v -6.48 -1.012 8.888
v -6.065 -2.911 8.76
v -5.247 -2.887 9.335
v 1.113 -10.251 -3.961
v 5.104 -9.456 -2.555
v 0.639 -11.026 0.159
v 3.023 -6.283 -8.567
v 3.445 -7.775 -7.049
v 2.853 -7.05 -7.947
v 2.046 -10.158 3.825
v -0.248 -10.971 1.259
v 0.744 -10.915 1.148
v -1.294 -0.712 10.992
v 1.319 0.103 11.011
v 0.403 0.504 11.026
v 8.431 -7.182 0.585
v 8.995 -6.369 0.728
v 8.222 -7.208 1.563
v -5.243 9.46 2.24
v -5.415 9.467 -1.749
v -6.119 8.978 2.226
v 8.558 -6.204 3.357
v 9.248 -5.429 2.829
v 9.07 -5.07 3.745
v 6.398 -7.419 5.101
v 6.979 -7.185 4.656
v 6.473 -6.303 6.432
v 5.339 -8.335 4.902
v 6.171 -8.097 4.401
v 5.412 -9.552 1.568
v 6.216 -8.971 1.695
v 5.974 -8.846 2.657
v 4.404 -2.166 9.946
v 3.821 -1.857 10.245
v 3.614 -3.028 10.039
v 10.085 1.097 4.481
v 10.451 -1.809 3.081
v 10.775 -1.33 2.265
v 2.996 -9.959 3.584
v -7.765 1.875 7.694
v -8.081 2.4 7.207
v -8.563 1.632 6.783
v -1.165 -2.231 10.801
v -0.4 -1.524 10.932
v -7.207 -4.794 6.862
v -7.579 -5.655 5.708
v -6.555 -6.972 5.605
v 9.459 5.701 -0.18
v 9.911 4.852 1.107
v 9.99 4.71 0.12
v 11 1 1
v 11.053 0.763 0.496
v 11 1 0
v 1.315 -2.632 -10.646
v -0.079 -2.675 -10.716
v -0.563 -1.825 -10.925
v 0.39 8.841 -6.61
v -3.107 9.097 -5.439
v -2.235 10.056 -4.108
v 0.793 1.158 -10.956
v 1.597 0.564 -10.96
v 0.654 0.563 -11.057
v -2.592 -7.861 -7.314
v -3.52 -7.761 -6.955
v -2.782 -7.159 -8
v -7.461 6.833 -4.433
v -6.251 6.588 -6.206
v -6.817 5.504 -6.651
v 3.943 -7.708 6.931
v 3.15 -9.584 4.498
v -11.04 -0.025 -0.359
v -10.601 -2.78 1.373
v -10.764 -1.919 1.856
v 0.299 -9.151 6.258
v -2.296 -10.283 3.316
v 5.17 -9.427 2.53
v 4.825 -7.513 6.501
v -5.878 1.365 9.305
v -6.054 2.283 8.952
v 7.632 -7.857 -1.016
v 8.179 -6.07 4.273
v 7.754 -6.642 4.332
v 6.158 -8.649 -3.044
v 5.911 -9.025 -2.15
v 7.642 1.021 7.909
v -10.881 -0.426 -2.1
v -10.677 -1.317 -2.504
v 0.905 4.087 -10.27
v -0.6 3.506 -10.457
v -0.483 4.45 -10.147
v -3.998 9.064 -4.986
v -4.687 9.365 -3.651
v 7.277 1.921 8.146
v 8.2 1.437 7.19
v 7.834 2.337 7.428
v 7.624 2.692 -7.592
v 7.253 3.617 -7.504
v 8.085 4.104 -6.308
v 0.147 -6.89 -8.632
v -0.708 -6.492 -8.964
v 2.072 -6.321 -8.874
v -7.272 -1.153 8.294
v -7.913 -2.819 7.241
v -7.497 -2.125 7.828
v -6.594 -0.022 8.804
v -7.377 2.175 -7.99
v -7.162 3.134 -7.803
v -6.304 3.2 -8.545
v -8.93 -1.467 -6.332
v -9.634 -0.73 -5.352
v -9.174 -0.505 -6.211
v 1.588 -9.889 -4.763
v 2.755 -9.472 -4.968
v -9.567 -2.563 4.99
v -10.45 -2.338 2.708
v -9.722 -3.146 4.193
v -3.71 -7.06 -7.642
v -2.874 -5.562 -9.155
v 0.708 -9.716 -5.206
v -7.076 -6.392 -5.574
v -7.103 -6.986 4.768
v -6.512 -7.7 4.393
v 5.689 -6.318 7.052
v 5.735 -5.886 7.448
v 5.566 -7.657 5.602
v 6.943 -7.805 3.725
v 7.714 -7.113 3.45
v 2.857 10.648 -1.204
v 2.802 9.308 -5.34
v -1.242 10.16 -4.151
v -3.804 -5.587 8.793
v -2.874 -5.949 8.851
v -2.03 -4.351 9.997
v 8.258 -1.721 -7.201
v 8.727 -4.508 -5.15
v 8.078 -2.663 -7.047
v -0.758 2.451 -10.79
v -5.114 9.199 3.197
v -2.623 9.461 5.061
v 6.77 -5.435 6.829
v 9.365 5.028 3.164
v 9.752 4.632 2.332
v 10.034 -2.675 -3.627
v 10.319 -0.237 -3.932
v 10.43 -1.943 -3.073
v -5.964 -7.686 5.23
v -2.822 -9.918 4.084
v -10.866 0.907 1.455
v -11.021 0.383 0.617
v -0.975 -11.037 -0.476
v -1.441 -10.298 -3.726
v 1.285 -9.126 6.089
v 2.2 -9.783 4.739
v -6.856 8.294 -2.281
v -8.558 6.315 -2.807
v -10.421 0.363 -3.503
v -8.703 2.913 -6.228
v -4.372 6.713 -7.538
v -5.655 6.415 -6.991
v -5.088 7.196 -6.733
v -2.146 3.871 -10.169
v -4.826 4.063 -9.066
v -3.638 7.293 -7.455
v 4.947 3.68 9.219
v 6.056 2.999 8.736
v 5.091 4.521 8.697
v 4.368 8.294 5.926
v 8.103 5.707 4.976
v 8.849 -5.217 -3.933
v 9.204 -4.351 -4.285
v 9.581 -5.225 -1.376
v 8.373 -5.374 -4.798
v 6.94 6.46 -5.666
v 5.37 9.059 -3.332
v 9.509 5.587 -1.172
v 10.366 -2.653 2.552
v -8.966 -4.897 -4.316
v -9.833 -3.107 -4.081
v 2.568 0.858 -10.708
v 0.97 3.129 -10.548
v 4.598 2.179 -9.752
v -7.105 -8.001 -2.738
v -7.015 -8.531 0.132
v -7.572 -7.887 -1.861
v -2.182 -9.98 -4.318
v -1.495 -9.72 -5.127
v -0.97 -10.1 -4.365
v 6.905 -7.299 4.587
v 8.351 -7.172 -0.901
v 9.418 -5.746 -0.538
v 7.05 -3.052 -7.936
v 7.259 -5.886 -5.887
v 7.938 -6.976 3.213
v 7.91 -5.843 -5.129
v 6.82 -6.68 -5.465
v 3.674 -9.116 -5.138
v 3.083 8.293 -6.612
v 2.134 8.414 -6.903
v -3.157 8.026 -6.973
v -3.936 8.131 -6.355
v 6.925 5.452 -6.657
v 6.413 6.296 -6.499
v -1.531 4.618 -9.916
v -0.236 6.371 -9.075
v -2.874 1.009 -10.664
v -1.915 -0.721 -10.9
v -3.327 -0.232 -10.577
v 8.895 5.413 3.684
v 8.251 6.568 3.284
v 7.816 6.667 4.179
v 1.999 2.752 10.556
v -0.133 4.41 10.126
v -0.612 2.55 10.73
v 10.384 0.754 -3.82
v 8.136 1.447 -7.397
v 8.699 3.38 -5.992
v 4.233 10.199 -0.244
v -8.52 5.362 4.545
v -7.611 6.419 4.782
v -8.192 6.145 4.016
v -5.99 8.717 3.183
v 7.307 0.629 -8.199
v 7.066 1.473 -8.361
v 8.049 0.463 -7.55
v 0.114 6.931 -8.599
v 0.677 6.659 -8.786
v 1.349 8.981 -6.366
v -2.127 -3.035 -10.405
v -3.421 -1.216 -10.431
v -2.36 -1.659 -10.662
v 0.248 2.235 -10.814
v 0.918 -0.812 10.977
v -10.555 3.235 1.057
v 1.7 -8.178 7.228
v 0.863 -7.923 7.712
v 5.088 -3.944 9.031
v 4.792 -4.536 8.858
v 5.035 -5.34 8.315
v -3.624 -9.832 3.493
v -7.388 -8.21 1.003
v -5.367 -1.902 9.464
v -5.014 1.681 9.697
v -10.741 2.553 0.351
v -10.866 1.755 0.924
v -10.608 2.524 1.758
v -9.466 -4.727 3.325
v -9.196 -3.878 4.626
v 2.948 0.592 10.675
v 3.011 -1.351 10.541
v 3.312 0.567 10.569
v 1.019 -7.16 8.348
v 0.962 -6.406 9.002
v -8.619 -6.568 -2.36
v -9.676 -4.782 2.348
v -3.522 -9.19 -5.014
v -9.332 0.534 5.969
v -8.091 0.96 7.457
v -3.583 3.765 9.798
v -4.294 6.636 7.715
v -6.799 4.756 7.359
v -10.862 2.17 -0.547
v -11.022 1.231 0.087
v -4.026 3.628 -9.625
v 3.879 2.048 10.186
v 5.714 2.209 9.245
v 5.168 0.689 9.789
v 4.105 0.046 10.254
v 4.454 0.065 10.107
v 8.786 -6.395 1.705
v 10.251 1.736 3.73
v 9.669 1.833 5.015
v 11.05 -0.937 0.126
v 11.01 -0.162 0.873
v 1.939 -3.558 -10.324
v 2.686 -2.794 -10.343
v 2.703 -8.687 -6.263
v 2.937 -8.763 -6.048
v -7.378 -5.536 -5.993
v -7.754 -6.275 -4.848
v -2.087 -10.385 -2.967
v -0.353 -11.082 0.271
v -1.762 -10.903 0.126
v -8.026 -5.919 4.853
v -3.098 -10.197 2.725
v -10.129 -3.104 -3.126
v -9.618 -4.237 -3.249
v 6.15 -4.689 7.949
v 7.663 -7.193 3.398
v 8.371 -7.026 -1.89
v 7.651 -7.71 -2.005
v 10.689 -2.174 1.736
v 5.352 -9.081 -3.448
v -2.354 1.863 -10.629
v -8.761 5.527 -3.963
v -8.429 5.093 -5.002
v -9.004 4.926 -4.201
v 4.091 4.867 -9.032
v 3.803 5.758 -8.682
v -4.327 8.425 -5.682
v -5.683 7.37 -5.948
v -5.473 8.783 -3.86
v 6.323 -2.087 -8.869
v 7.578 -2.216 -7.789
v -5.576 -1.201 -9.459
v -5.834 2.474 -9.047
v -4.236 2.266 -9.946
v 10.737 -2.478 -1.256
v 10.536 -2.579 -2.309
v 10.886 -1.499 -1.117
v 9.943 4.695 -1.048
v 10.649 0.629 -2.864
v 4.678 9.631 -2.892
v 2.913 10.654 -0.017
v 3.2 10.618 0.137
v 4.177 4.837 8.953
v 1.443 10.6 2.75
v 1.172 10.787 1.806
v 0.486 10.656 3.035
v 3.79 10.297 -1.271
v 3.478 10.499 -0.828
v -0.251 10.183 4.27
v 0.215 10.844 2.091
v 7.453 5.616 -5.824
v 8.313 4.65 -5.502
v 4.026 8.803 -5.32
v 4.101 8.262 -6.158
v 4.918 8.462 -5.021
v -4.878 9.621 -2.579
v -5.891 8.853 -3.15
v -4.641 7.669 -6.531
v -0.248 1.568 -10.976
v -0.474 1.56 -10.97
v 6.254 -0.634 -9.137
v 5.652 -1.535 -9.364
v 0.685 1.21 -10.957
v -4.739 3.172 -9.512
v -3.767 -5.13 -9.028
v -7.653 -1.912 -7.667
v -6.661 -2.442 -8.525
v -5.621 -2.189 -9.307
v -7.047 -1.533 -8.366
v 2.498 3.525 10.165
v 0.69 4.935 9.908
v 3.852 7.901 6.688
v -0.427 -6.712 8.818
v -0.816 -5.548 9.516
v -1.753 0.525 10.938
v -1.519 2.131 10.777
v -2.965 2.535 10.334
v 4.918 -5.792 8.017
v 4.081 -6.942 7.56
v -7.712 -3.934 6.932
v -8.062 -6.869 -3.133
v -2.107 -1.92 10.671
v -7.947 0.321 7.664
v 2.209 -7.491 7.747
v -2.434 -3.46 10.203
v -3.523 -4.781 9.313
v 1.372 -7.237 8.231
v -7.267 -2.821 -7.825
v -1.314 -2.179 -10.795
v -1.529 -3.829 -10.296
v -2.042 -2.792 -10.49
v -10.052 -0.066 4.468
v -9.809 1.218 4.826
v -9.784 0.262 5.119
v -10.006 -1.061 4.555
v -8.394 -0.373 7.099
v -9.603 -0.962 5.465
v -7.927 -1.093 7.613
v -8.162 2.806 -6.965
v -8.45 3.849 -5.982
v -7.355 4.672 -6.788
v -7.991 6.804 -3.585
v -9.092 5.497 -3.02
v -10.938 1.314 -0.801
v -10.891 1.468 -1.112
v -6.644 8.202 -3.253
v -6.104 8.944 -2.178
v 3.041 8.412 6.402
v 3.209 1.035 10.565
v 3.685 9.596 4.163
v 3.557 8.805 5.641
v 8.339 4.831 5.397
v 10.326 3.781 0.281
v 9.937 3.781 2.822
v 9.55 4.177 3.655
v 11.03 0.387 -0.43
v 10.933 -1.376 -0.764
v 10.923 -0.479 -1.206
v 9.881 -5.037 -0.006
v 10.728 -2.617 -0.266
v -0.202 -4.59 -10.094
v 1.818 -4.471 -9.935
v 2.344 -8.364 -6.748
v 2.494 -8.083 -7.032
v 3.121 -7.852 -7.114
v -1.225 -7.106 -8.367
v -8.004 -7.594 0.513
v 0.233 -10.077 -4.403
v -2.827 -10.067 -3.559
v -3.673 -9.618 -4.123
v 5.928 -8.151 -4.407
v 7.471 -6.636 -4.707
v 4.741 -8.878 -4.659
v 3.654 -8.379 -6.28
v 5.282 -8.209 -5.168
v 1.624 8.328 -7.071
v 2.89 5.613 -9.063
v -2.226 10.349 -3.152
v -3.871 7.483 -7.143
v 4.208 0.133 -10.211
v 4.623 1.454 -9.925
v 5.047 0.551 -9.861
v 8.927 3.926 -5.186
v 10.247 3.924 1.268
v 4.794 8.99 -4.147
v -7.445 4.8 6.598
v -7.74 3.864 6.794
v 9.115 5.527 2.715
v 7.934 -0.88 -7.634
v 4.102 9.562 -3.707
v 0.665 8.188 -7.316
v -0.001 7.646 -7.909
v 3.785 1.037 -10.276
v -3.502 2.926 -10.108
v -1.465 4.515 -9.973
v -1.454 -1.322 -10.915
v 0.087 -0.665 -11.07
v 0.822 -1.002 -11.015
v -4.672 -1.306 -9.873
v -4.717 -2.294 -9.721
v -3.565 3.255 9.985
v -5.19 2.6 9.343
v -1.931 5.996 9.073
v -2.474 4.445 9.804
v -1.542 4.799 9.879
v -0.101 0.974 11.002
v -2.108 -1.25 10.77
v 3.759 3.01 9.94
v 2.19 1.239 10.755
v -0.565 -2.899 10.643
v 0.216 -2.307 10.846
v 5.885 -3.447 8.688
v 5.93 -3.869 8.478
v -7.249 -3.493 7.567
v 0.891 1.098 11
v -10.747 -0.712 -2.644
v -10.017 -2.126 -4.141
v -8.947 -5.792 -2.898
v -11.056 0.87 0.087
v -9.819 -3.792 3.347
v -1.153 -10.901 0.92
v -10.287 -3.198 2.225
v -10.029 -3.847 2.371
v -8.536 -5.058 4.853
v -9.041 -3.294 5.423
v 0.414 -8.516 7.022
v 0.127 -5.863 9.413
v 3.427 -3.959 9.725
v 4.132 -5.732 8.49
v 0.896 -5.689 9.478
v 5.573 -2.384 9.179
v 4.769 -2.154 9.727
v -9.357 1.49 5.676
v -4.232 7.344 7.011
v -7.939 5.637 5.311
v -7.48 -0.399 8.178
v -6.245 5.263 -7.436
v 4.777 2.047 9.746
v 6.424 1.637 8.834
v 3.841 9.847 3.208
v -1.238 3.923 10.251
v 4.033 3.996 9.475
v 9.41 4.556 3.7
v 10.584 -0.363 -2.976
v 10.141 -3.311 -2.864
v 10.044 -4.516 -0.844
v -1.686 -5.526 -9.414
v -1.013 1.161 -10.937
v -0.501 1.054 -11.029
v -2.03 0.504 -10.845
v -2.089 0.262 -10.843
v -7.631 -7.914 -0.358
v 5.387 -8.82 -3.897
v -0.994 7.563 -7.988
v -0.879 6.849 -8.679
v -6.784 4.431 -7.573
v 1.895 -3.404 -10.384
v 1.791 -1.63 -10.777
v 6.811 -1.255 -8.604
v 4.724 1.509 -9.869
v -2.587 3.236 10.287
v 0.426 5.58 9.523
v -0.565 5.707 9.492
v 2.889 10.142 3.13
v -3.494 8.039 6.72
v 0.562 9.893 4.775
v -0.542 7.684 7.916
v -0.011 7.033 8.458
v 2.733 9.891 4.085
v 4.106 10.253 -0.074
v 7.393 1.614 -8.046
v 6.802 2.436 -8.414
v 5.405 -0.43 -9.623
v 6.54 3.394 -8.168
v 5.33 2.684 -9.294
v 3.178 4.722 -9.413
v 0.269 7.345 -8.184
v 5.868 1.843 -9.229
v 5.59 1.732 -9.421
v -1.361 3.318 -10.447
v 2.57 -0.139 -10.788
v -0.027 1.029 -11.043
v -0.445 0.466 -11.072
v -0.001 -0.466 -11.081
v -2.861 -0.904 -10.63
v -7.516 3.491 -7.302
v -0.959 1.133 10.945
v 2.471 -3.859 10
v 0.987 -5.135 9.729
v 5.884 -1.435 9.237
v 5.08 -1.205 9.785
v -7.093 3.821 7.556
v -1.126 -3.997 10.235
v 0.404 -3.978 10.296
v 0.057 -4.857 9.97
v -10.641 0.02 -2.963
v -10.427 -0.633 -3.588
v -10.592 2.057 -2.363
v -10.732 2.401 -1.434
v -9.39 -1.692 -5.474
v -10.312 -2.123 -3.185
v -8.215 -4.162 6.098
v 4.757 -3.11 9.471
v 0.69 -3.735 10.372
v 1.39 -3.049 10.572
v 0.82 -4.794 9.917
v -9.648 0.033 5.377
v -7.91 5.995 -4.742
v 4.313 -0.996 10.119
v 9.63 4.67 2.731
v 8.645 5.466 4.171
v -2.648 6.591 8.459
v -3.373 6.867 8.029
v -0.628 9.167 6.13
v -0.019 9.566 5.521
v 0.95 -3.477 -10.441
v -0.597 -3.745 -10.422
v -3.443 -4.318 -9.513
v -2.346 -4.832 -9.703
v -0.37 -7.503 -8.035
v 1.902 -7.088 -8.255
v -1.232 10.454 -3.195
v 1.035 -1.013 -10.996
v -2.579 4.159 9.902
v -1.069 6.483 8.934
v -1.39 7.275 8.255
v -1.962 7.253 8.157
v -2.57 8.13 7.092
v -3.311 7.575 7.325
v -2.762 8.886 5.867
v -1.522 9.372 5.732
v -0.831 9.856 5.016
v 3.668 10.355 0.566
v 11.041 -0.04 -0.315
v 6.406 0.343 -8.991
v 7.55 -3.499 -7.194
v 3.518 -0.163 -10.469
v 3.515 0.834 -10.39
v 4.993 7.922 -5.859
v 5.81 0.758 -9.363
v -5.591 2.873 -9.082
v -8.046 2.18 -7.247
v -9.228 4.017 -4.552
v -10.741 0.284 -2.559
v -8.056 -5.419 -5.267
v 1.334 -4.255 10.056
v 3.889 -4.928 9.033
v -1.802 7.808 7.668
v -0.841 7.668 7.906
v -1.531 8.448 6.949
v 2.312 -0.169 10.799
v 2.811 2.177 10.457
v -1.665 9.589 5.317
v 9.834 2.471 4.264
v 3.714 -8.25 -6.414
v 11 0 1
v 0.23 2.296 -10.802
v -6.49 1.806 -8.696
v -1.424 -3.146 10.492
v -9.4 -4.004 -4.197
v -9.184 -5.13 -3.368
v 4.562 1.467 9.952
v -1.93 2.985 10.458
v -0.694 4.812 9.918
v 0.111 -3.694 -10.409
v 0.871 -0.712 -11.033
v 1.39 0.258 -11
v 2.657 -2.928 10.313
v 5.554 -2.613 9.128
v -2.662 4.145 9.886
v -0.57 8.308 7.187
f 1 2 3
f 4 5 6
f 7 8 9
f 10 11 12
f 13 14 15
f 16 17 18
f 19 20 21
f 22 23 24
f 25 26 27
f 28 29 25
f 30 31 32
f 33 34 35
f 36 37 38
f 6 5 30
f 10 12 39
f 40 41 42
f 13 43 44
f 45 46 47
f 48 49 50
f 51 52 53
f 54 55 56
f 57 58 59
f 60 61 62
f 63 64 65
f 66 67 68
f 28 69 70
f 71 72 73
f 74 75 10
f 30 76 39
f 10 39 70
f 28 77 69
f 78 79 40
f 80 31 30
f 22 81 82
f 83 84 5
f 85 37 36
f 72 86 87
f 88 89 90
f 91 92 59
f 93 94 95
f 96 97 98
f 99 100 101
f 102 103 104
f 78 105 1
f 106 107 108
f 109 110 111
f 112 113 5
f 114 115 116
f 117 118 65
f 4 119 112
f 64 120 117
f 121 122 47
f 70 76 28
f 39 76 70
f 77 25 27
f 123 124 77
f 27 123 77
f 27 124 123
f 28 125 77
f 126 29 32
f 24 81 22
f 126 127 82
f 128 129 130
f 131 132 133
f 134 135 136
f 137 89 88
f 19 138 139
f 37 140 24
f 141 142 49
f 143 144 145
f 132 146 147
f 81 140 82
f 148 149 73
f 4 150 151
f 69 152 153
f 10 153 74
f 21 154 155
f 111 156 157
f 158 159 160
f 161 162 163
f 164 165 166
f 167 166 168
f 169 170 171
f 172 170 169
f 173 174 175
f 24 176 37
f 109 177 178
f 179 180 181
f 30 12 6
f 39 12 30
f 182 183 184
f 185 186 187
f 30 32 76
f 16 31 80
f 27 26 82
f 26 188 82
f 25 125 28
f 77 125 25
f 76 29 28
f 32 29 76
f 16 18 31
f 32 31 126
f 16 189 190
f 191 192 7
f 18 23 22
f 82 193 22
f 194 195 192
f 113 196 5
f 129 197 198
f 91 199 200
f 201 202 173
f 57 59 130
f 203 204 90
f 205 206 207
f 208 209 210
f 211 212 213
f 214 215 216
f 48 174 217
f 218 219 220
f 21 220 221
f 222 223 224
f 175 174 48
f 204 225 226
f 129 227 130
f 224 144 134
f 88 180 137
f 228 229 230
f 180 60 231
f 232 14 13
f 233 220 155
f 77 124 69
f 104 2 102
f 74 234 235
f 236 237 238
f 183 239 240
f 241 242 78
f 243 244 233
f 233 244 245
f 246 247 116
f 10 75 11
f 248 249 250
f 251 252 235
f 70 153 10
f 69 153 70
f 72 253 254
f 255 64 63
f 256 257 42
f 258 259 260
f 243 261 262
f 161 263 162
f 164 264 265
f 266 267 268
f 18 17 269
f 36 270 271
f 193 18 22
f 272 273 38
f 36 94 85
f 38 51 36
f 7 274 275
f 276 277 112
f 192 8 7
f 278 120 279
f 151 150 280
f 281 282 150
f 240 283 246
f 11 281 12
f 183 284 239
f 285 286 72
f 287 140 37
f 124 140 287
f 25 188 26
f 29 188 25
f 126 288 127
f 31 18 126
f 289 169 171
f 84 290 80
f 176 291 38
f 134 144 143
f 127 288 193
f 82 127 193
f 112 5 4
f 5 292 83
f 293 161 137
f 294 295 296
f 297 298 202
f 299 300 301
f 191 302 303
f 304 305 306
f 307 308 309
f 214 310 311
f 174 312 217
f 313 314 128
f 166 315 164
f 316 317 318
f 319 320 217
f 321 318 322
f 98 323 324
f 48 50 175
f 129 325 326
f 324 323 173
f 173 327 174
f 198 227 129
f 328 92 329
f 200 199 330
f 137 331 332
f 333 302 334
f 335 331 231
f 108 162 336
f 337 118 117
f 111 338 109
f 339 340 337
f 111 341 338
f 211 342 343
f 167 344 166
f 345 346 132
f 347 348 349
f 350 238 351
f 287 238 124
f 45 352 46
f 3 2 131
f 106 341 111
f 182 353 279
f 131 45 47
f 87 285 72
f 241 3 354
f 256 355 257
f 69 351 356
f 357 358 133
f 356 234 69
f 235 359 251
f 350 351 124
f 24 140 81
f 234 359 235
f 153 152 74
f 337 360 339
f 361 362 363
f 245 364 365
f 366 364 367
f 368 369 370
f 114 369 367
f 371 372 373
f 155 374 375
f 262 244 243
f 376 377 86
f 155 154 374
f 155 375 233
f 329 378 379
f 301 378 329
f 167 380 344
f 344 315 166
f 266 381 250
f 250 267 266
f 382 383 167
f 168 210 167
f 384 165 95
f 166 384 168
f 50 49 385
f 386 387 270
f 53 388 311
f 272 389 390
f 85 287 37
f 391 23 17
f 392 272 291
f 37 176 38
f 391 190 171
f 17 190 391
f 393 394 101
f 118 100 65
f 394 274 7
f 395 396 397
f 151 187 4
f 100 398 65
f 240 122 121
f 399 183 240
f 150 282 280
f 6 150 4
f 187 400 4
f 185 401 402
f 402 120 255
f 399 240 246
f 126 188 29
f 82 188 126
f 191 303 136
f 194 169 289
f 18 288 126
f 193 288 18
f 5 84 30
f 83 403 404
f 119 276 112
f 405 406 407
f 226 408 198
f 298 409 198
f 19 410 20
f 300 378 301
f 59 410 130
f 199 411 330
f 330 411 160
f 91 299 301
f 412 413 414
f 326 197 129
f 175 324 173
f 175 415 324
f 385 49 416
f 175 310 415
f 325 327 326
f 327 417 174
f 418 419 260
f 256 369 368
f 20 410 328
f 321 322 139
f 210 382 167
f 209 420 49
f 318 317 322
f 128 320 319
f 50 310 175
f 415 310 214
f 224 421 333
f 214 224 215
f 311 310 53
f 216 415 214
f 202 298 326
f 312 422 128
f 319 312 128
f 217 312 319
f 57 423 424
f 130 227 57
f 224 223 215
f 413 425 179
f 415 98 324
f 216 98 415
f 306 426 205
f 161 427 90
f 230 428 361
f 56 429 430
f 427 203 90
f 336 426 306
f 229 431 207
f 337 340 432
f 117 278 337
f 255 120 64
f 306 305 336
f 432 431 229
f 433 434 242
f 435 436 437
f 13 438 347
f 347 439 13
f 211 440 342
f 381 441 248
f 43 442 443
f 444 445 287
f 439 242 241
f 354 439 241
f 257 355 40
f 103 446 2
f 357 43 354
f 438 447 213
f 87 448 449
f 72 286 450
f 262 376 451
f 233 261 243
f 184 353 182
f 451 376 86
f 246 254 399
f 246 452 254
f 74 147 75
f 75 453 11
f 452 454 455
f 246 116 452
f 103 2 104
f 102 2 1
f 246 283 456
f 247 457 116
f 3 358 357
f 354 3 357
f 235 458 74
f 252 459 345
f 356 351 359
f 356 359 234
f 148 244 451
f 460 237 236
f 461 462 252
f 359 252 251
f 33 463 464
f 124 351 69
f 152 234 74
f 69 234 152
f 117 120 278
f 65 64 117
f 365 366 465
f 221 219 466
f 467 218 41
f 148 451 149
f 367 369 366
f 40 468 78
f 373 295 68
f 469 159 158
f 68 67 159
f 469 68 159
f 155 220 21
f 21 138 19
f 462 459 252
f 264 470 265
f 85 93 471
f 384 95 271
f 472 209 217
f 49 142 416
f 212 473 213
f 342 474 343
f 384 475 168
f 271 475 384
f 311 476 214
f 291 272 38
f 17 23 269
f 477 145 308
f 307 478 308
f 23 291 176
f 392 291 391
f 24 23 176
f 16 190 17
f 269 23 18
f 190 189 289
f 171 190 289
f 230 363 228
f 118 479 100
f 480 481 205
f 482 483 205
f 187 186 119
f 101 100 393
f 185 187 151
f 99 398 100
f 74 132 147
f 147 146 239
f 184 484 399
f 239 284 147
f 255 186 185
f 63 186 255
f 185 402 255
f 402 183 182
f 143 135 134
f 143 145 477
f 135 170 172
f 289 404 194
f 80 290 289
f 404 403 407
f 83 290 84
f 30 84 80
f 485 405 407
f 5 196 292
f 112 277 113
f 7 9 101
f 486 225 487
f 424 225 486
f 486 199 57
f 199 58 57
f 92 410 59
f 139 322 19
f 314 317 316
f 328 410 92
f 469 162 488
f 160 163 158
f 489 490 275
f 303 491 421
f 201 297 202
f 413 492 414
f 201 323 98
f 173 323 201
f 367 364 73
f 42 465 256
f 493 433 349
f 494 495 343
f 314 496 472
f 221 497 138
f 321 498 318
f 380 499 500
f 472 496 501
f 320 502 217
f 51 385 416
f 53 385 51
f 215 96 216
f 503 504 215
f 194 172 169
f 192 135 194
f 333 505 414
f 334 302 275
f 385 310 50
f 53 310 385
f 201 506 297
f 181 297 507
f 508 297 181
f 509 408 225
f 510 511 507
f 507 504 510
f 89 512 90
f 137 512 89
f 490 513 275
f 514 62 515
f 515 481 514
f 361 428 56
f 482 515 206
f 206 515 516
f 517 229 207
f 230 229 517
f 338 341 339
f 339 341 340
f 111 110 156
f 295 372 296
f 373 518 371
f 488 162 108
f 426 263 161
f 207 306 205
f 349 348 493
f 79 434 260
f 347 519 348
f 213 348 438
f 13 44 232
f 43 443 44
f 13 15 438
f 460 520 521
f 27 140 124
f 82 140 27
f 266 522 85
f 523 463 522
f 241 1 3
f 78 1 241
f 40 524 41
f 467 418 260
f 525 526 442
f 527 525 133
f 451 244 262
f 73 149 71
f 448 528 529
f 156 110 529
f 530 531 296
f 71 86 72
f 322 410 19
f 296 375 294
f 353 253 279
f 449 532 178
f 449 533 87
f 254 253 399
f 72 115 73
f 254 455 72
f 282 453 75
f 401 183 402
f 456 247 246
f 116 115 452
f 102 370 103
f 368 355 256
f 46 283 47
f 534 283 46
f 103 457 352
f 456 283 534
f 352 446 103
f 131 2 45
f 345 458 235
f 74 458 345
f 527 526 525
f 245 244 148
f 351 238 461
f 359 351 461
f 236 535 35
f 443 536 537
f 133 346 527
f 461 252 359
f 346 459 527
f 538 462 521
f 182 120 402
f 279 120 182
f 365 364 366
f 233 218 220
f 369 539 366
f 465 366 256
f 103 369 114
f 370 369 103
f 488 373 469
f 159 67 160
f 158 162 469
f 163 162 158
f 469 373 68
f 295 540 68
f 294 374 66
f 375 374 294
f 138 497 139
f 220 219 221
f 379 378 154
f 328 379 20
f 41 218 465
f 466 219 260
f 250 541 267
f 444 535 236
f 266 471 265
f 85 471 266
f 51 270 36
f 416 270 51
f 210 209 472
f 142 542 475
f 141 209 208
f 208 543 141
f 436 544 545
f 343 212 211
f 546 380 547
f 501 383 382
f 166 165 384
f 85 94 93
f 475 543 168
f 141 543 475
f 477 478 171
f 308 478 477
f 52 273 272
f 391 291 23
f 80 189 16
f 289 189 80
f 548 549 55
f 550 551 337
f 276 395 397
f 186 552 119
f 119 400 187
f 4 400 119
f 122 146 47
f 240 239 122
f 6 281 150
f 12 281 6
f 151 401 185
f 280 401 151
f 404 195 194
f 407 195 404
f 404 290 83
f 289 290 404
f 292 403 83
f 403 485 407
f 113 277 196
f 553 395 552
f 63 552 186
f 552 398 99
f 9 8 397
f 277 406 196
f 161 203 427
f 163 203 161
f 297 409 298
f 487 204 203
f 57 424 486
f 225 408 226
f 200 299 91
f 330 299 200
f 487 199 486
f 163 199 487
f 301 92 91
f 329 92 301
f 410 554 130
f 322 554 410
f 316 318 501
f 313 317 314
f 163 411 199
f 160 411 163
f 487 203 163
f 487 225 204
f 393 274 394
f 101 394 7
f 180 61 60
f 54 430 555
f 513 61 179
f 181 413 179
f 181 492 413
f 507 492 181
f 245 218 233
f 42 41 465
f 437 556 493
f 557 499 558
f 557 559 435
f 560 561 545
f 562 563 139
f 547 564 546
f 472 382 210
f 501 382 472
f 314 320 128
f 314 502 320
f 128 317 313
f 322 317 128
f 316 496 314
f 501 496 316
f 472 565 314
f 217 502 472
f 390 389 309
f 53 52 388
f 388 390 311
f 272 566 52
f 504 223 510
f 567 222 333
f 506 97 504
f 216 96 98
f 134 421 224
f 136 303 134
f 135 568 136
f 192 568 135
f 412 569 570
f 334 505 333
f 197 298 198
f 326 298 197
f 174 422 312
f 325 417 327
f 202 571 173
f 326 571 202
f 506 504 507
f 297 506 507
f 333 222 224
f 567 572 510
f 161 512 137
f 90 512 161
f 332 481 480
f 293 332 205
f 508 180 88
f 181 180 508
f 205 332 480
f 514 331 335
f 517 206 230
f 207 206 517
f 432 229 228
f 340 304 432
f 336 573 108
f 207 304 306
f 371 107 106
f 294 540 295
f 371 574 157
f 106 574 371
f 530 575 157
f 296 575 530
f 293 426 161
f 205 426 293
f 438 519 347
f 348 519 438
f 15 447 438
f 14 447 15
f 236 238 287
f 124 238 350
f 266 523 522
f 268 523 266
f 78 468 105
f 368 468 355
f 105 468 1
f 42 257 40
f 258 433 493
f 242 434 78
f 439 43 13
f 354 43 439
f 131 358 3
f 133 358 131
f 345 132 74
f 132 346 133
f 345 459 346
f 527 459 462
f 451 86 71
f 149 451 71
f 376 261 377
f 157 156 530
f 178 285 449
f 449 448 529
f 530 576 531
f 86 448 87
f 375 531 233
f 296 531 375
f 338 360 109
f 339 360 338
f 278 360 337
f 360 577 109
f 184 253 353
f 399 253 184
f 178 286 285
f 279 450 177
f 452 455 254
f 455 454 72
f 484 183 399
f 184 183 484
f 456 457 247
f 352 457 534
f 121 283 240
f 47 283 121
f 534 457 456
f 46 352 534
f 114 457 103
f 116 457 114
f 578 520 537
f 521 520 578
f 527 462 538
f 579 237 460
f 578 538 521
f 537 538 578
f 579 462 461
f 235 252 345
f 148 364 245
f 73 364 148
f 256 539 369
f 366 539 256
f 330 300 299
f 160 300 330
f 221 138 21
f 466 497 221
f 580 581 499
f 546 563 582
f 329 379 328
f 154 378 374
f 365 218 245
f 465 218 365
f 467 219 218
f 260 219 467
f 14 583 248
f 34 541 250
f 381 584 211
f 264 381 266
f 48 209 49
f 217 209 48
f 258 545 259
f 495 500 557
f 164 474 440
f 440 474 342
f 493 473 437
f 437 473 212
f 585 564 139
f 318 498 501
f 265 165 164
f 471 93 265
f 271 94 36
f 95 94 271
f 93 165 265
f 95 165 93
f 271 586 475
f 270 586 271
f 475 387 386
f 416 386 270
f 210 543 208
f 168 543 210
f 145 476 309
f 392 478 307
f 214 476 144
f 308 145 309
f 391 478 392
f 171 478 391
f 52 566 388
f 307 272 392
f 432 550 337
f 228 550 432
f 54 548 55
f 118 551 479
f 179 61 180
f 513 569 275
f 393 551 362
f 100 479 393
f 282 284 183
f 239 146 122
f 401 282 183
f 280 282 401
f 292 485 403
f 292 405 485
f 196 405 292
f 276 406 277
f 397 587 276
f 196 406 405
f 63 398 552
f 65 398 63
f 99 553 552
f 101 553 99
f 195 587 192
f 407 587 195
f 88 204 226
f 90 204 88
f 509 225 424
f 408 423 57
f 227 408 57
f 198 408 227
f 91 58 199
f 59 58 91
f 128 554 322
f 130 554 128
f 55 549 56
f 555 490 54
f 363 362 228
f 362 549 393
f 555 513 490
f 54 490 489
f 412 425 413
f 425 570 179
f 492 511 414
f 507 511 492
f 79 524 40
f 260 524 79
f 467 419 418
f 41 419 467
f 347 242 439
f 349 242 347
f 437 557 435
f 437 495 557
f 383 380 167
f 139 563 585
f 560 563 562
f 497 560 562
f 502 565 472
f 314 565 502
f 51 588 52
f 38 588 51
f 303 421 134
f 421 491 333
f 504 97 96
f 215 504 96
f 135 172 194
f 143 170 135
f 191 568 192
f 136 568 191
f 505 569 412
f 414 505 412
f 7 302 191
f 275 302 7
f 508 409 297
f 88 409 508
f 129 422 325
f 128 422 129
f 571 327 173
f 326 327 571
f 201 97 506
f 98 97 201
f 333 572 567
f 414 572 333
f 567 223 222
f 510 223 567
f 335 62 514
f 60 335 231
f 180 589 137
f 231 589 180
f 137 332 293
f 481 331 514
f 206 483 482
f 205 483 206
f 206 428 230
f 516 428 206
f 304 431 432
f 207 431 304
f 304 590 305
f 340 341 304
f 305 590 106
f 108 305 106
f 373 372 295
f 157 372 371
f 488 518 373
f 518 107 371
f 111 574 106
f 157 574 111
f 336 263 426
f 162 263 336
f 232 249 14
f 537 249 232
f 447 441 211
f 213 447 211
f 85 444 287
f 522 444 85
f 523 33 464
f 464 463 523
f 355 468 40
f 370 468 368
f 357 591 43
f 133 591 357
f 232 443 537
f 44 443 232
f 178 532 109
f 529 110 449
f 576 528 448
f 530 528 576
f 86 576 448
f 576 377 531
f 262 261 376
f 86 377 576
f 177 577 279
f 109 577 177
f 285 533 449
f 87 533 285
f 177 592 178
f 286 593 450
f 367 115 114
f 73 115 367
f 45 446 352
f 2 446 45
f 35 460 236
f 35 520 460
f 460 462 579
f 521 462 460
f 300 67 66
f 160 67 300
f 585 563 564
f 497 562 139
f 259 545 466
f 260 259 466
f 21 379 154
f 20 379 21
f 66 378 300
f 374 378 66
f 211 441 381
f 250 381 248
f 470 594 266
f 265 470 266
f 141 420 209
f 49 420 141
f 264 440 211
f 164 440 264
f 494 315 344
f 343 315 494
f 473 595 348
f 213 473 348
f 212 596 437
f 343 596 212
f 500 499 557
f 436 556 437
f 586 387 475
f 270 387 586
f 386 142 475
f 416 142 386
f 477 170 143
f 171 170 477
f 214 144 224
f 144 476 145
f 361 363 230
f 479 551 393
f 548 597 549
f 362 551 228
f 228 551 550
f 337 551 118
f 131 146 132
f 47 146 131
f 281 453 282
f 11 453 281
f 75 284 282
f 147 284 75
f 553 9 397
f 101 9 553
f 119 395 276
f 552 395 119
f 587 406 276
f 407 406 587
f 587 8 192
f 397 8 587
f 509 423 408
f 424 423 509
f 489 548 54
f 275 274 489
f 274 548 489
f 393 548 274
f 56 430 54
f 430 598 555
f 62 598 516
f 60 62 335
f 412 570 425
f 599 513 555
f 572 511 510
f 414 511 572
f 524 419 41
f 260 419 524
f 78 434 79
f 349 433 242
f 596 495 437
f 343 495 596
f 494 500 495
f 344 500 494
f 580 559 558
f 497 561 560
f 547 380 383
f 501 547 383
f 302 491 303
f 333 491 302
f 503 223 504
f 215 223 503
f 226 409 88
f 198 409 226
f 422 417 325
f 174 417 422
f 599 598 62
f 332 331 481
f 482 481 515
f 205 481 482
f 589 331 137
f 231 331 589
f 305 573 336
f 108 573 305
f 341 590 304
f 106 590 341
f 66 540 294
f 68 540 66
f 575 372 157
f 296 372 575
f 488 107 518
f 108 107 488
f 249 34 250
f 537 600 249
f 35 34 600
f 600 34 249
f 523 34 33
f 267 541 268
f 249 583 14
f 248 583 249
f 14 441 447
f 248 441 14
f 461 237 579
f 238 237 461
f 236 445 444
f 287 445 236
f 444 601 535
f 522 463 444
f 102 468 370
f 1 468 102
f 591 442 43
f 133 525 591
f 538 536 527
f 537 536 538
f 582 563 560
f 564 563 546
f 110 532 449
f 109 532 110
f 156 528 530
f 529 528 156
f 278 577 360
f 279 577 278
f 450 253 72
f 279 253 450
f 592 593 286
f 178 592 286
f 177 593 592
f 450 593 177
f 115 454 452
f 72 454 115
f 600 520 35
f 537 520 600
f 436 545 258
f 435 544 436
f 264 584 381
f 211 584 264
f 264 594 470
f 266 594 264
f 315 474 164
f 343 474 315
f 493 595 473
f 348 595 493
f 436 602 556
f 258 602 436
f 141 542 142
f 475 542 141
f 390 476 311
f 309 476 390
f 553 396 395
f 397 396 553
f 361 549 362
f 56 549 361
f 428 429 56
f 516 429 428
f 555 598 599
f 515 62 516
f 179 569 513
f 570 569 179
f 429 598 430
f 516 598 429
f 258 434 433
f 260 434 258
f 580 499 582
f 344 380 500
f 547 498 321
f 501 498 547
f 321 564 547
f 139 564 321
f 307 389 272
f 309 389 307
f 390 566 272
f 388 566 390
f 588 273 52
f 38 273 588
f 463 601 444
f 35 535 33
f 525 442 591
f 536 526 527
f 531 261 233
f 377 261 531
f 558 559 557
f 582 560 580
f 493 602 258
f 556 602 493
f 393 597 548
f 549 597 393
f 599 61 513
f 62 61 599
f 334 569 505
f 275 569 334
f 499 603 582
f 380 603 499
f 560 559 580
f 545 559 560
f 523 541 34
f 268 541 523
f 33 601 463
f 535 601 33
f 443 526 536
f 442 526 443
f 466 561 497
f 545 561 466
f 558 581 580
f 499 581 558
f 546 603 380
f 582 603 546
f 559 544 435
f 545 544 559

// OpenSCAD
points=600;
random_angles=rands(0,360,points,42);
 
hull()
  for(i=[0:3:points])
    rotate([random_angles[i],random_angles[i+1],random_angles[i+2]]) translate([10,0,0]) cube();
